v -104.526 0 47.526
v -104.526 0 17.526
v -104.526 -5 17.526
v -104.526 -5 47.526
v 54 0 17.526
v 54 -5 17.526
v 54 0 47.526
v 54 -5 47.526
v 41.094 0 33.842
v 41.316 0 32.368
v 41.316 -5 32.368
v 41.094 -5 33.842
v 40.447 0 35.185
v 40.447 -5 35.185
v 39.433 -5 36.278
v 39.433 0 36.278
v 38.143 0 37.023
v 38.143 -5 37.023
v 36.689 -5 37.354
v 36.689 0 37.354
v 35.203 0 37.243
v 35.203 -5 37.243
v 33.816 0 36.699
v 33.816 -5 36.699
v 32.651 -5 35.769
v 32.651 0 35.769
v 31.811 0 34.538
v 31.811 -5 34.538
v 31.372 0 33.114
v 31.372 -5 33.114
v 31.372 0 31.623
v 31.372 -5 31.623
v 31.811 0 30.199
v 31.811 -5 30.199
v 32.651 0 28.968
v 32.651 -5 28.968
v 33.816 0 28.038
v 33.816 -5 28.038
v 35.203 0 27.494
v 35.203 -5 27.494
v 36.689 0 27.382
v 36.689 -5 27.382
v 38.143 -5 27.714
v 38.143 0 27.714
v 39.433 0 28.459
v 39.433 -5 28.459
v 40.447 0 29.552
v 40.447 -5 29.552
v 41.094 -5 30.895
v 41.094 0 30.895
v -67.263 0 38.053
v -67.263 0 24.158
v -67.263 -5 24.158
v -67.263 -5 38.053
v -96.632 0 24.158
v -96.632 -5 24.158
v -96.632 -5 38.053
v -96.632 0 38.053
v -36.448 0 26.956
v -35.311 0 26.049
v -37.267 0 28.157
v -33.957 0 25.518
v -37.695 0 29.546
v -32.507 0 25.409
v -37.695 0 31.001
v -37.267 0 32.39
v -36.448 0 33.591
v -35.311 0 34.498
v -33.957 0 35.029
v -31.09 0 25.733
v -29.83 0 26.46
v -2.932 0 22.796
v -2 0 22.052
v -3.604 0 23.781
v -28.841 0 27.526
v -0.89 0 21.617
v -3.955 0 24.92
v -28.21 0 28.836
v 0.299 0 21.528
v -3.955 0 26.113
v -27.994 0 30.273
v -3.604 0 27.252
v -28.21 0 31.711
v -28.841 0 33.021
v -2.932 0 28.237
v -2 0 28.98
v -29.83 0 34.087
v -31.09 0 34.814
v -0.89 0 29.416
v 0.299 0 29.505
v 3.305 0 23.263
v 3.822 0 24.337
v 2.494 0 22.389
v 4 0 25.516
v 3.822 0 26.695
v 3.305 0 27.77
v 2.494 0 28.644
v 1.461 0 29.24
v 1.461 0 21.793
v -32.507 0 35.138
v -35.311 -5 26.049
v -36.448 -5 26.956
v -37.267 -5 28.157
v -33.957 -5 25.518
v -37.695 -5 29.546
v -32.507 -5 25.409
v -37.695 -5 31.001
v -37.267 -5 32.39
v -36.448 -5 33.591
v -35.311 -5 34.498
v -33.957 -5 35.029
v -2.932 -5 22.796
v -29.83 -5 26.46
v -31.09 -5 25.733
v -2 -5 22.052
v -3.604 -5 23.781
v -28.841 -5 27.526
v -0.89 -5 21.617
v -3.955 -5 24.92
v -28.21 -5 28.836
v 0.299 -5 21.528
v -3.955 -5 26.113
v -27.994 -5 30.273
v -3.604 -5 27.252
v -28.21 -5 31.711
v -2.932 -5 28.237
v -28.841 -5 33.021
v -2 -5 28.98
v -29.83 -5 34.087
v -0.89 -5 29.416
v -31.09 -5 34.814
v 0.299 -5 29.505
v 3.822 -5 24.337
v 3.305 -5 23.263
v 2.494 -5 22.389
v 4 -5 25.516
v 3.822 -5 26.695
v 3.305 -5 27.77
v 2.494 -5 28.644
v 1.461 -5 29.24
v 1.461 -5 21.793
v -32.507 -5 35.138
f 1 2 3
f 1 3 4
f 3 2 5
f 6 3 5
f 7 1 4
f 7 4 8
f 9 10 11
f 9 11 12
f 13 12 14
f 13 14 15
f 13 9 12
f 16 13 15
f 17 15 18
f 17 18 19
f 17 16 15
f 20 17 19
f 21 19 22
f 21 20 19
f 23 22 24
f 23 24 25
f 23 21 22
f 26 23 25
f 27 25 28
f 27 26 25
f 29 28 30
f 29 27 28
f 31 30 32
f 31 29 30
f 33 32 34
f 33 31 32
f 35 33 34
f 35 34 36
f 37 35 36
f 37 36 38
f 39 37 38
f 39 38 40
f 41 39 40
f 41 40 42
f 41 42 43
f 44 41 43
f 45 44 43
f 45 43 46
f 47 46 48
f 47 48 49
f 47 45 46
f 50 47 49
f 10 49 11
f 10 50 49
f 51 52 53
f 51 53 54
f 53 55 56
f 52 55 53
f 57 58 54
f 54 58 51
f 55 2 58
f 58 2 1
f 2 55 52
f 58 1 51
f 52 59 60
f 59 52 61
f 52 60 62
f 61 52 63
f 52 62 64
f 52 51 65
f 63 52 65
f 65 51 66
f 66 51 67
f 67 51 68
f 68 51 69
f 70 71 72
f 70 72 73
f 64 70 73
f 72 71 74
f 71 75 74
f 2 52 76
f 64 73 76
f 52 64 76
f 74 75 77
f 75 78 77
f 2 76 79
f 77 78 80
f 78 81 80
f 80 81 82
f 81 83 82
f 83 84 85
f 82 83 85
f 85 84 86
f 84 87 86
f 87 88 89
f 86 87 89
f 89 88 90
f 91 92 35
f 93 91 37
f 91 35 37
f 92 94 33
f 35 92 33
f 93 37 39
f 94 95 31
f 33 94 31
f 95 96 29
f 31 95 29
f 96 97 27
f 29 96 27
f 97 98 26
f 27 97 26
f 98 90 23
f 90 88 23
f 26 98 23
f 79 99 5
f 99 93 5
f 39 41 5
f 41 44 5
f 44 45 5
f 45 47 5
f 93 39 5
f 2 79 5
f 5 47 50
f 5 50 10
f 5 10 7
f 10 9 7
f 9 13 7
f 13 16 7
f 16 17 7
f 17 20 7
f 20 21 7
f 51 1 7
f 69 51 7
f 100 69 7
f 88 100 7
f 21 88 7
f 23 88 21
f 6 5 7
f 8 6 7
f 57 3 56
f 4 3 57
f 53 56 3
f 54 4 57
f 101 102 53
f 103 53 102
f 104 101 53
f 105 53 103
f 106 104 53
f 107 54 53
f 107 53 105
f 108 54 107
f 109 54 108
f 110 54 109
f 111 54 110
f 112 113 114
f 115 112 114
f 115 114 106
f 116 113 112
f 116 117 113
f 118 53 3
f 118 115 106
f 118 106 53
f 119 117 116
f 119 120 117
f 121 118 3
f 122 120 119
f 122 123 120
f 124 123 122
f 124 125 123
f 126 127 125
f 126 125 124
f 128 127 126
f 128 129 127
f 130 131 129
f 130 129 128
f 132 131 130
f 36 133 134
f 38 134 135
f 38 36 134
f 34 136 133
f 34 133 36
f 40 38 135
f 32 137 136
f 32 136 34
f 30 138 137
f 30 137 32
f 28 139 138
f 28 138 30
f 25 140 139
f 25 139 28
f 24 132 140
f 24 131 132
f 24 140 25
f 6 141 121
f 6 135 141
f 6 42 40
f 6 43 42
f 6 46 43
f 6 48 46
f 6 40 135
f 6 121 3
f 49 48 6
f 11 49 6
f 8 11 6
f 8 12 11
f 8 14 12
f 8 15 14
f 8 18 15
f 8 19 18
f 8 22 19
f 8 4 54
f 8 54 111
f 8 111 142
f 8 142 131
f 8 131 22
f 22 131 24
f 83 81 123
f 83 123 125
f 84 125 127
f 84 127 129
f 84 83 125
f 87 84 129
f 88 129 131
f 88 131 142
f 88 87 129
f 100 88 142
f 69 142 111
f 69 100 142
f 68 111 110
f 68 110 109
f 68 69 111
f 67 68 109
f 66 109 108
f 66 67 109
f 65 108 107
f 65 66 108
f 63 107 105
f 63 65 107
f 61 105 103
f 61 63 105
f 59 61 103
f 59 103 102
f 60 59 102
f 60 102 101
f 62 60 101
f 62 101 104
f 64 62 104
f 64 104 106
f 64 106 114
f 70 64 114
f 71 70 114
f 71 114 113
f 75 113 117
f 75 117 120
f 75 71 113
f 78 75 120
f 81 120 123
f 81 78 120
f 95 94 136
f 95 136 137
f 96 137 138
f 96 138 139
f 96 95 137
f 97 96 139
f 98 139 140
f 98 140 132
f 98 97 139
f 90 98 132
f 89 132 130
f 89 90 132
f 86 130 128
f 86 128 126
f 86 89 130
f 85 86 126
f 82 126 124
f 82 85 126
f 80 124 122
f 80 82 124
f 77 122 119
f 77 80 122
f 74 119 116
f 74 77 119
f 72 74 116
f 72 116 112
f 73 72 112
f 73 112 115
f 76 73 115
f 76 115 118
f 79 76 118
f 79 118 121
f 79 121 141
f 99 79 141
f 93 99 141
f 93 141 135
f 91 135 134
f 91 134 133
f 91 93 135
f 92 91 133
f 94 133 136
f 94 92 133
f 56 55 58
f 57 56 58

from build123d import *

# Parameters (mm, degrees)
F0_W     = 158.526307
F0_H     = 30
F0_W_2   = 29.368418
F0_H_2   = 13.894737
F0_R     = 4.878109
F0_R_2   = 4
F0_R_3   = 5
F1_DEPTH = 5


with BuildPart() as f1:
    # F0 (on Front) → F1 (new body)
    with BuildSketch(Plane.XZ):
        with Locations((-25.263152, 32.526316)):
            Rectangle(F0_W, F0_H)
        with Locations((-81.947357, 31.105263)):
            Rectangle(F0_W_2, F0_H_2, mode=Mode.SUBTRACT)
        with Locations((-32.871829, 30.273478)):
            Circle(F0_R, mode=Mode.SUBTRACT)
        with Locations((0, 25.516342)):
            Circle(F0_R_2, mode=Mode.SUBTRACT)
        with Locations((36.315795, 32.368422)):
            Circle(F0_R_3, mode=Mode.SUBTRACT)
    extrude(amount=F1_DEPTH)


solid = f1.part
